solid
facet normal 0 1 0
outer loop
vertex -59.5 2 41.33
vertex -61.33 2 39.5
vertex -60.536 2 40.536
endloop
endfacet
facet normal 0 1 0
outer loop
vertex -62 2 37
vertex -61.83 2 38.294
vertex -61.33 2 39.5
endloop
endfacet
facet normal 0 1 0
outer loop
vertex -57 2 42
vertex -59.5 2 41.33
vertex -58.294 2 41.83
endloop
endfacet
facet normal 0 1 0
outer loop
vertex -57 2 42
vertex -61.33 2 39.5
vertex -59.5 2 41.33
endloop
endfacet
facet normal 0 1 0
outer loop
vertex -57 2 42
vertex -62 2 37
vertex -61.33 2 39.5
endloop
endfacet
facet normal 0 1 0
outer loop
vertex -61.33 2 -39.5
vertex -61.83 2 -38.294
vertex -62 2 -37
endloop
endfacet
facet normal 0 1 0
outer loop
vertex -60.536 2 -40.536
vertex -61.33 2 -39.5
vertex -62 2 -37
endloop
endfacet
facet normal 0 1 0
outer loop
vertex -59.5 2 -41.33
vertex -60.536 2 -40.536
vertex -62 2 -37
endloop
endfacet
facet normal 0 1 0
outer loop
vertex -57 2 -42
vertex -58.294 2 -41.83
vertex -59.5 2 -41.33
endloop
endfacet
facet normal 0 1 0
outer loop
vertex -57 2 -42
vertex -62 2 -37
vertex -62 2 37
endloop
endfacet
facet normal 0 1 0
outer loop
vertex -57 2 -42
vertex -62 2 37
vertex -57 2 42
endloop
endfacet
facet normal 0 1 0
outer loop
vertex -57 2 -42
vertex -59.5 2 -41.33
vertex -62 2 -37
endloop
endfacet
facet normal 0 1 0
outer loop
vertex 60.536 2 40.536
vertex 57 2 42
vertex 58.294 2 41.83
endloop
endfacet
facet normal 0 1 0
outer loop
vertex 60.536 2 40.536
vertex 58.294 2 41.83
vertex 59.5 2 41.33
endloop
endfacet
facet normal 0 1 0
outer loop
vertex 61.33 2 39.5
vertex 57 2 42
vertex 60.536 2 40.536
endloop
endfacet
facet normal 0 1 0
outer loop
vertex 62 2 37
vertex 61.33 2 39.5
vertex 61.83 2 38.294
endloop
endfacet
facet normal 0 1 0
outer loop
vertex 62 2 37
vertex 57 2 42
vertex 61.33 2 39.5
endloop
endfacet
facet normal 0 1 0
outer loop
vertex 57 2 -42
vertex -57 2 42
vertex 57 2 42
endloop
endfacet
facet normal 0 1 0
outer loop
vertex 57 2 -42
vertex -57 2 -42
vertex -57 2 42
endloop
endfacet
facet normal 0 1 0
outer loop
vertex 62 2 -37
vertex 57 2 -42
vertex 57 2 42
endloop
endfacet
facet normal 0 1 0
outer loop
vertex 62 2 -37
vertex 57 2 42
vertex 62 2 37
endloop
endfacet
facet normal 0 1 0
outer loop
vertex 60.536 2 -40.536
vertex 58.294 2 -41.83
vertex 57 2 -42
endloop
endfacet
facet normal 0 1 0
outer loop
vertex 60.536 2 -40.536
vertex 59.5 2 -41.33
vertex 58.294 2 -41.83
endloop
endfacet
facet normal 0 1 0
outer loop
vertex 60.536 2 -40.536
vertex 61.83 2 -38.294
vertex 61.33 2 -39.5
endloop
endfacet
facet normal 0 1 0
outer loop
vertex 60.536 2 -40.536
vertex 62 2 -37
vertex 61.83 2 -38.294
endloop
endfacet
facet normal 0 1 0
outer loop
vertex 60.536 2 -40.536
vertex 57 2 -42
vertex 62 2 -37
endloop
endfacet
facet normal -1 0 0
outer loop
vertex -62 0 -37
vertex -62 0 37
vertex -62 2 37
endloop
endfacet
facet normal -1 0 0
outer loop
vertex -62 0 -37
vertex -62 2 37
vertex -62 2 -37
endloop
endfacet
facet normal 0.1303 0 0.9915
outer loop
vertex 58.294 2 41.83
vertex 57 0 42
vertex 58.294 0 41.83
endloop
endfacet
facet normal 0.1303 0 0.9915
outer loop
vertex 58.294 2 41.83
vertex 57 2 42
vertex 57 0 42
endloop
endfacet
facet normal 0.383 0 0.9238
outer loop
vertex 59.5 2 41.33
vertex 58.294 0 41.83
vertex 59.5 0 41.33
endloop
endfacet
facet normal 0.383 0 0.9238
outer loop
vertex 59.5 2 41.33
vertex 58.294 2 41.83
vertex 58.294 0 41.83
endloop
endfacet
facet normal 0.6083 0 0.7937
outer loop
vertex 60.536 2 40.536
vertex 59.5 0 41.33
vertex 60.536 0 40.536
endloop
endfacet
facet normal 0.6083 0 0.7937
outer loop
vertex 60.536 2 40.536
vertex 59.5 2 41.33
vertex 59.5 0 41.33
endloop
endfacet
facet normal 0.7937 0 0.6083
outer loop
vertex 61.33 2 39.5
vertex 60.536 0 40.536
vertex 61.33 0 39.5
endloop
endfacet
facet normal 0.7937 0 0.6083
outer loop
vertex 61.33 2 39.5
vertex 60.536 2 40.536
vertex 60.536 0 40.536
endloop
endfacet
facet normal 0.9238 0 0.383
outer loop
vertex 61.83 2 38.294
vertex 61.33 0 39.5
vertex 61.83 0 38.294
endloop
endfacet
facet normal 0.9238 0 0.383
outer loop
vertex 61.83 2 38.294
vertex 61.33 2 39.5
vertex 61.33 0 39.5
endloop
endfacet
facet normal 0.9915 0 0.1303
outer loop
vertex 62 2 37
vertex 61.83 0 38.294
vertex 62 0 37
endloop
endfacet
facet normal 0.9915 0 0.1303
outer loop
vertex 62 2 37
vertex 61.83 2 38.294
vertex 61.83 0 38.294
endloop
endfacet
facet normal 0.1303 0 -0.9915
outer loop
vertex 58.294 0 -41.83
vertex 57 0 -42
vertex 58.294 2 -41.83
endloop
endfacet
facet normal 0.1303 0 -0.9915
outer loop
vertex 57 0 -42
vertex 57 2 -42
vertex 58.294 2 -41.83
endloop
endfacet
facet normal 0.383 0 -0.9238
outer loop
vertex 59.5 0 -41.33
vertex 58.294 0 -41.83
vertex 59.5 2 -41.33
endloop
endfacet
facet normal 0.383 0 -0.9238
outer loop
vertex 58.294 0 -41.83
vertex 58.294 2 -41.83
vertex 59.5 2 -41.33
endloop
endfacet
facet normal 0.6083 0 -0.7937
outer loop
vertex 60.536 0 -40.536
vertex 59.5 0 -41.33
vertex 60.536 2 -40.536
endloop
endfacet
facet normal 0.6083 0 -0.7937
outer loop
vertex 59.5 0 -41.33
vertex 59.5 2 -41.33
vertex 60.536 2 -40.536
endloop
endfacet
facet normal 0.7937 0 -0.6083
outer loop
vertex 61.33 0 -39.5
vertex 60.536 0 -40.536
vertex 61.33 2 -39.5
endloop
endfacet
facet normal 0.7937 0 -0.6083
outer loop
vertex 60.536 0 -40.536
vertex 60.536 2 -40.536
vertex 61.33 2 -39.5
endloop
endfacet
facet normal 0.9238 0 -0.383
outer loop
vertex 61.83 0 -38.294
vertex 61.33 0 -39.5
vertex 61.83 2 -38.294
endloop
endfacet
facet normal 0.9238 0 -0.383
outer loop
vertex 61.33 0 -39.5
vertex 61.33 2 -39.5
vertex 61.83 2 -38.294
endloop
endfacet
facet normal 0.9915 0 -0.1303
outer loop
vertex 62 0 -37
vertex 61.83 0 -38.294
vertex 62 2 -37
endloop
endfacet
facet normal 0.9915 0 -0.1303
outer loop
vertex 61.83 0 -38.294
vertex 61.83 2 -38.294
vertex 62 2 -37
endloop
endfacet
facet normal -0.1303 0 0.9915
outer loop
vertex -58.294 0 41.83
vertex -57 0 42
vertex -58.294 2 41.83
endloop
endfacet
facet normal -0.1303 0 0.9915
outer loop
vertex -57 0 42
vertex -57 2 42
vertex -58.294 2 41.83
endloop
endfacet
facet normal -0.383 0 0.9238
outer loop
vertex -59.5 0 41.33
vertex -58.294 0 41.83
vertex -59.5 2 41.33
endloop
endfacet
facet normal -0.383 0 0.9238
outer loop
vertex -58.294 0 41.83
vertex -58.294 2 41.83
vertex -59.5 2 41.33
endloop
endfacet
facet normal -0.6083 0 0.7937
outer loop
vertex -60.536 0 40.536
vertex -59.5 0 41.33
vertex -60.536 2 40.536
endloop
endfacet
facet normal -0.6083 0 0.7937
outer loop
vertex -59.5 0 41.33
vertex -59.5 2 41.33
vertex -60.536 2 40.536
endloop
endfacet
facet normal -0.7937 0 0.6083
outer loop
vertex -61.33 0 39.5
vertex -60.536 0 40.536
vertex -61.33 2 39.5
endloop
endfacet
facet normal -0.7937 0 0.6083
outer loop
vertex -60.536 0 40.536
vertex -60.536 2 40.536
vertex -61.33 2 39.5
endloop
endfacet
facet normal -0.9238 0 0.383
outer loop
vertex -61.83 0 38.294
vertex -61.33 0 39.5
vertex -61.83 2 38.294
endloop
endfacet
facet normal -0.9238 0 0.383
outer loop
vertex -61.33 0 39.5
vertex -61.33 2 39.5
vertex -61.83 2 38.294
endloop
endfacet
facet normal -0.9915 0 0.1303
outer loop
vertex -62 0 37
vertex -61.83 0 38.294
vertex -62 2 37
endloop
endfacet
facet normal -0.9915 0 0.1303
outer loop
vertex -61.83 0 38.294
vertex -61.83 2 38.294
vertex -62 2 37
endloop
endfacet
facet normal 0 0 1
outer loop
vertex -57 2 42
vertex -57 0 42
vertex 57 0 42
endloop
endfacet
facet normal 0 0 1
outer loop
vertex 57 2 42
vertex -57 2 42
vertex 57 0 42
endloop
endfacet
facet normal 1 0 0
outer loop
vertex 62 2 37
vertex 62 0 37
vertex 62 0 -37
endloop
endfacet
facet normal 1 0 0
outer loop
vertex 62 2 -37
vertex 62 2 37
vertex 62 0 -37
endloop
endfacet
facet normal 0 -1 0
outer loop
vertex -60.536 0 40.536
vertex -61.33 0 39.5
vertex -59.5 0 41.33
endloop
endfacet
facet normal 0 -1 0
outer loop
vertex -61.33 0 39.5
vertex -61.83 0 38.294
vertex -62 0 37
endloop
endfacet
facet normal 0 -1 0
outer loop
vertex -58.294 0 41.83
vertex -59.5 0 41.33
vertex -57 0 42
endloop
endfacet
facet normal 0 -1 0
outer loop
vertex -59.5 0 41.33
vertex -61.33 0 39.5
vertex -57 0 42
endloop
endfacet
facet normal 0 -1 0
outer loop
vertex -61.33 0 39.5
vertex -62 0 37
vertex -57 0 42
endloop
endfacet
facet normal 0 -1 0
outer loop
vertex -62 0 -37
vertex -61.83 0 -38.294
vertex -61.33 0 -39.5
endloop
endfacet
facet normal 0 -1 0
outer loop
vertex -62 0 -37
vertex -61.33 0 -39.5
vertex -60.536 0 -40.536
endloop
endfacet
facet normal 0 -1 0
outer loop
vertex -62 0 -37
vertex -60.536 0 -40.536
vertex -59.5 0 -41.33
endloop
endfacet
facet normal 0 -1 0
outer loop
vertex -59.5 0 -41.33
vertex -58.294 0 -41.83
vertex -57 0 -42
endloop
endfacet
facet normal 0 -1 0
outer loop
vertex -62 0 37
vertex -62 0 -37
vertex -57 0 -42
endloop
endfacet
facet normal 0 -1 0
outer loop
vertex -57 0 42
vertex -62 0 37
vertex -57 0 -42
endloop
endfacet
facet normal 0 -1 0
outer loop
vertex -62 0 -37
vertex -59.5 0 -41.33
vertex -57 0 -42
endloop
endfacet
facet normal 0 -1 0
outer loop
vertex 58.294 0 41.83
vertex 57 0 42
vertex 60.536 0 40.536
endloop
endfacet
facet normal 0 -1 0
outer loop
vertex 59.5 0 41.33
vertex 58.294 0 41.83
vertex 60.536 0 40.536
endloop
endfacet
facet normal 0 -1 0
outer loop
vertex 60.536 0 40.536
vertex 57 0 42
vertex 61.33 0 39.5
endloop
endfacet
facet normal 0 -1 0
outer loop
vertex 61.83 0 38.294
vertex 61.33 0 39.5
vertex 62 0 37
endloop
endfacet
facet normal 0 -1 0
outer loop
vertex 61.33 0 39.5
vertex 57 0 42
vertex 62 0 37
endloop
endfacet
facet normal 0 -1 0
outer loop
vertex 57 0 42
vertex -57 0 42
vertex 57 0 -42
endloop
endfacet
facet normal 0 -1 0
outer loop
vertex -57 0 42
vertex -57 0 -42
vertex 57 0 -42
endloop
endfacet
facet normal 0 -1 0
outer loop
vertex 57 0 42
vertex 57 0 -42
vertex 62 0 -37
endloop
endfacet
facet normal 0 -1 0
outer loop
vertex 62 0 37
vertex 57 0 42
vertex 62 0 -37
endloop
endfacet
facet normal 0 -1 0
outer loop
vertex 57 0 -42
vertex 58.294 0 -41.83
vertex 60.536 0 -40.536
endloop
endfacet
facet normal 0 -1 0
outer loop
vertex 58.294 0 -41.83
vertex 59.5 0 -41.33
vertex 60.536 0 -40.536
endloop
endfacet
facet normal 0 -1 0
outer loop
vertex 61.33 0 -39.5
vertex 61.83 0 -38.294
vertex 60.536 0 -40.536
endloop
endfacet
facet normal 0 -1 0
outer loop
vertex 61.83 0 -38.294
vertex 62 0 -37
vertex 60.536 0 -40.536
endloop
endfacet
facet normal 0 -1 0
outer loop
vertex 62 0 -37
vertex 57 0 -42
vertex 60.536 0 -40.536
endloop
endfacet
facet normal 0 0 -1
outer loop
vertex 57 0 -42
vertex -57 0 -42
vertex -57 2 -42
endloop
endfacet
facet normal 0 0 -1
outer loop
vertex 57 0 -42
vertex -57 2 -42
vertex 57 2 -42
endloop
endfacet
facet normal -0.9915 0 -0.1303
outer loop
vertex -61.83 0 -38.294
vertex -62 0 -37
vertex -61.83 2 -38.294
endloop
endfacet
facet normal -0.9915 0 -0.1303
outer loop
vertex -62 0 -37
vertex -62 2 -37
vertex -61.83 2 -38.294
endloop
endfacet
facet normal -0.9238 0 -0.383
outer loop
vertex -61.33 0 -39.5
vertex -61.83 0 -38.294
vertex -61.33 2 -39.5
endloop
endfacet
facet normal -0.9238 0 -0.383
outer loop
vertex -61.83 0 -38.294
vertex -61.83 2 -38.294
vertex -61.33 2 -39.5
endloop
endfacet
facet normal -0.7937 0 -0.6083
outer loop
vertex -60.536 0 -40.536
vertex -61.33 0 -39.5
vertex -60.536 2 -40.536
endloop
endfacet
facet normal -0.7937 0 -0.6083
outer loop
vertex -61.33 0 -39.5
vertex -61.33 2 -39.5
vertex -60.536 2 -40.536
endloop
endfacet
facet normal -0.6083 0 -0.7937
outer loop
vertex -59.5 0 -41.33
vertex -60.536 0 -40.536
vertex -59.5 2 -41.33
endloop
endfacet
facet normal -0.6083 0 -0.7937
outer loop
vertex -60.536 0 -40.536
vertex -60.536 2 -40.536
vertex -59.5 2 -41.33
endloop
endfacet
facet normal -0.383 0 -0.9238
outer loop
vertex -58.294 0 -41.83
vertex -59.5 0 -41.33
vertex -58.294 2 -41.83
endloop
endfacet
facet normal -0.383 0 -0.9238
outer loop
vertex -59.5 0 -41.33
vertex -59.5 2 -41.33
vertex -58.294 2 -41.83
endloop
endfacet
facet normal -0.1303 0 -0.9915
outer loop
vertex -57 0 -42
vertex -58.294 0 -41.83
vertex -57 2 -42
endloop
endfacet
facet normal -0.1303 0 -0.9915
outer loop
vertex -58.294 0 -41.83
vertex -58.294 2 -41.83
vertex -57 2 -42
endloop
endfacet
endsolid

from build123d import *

# Parameters (mm, degrees)
SKETCH1_W           = 124
SKETCH1_H           = 84
BOSS_EXTRUDE1_DEPTH = 2
FILLET1_R           = 5
FILLET2_R           = 5
FILLET3_R           = 5
FILLET4_R           = 5


with BuildPart() as part:
    # Sketch1 → Boss-Extrude1 (new body)
    with BuildSketch(Plane(origin=(0, 0, 0), x_dir=(1, 0, 0), z_dir=(0, 1, 0))):
        Rectangle(SKETCH1_W, SKETCH1_H)
    extrude(amount=BOSS_EXTRUDE1_DEPTH)

    # Fillet1
    fillet1_edges = [part.edges().sort_by_distance(p)[0] for p in [
        (62, 1, 42),
    ]]
    fillet(fillet1_edges, radius=FILLET1_R)

    # Fillet2
    fillet2_edges = [part.edges().sort_by_distance(p)[0] for p in [
        (-62, 1, 42),
    ]]
    fillet(fillet2_edges, radius=FILLET2_R)

    # Fillet3
    fillet3_edges = [part.edges().sort_by_distance(p)[0] for p in [
        (-62, 1, -42),
    ]]
    fillet(fillet3_edges, radius=FILLET3_R)

    # Fillet4
    fillet4_edges = [part.edges().sort_by_distance(p)[0] for p in [
        (62, 1, -42),
    ]]
    fillet(fillet4_edges, radius=FILLET4_R)


solid = part.part
